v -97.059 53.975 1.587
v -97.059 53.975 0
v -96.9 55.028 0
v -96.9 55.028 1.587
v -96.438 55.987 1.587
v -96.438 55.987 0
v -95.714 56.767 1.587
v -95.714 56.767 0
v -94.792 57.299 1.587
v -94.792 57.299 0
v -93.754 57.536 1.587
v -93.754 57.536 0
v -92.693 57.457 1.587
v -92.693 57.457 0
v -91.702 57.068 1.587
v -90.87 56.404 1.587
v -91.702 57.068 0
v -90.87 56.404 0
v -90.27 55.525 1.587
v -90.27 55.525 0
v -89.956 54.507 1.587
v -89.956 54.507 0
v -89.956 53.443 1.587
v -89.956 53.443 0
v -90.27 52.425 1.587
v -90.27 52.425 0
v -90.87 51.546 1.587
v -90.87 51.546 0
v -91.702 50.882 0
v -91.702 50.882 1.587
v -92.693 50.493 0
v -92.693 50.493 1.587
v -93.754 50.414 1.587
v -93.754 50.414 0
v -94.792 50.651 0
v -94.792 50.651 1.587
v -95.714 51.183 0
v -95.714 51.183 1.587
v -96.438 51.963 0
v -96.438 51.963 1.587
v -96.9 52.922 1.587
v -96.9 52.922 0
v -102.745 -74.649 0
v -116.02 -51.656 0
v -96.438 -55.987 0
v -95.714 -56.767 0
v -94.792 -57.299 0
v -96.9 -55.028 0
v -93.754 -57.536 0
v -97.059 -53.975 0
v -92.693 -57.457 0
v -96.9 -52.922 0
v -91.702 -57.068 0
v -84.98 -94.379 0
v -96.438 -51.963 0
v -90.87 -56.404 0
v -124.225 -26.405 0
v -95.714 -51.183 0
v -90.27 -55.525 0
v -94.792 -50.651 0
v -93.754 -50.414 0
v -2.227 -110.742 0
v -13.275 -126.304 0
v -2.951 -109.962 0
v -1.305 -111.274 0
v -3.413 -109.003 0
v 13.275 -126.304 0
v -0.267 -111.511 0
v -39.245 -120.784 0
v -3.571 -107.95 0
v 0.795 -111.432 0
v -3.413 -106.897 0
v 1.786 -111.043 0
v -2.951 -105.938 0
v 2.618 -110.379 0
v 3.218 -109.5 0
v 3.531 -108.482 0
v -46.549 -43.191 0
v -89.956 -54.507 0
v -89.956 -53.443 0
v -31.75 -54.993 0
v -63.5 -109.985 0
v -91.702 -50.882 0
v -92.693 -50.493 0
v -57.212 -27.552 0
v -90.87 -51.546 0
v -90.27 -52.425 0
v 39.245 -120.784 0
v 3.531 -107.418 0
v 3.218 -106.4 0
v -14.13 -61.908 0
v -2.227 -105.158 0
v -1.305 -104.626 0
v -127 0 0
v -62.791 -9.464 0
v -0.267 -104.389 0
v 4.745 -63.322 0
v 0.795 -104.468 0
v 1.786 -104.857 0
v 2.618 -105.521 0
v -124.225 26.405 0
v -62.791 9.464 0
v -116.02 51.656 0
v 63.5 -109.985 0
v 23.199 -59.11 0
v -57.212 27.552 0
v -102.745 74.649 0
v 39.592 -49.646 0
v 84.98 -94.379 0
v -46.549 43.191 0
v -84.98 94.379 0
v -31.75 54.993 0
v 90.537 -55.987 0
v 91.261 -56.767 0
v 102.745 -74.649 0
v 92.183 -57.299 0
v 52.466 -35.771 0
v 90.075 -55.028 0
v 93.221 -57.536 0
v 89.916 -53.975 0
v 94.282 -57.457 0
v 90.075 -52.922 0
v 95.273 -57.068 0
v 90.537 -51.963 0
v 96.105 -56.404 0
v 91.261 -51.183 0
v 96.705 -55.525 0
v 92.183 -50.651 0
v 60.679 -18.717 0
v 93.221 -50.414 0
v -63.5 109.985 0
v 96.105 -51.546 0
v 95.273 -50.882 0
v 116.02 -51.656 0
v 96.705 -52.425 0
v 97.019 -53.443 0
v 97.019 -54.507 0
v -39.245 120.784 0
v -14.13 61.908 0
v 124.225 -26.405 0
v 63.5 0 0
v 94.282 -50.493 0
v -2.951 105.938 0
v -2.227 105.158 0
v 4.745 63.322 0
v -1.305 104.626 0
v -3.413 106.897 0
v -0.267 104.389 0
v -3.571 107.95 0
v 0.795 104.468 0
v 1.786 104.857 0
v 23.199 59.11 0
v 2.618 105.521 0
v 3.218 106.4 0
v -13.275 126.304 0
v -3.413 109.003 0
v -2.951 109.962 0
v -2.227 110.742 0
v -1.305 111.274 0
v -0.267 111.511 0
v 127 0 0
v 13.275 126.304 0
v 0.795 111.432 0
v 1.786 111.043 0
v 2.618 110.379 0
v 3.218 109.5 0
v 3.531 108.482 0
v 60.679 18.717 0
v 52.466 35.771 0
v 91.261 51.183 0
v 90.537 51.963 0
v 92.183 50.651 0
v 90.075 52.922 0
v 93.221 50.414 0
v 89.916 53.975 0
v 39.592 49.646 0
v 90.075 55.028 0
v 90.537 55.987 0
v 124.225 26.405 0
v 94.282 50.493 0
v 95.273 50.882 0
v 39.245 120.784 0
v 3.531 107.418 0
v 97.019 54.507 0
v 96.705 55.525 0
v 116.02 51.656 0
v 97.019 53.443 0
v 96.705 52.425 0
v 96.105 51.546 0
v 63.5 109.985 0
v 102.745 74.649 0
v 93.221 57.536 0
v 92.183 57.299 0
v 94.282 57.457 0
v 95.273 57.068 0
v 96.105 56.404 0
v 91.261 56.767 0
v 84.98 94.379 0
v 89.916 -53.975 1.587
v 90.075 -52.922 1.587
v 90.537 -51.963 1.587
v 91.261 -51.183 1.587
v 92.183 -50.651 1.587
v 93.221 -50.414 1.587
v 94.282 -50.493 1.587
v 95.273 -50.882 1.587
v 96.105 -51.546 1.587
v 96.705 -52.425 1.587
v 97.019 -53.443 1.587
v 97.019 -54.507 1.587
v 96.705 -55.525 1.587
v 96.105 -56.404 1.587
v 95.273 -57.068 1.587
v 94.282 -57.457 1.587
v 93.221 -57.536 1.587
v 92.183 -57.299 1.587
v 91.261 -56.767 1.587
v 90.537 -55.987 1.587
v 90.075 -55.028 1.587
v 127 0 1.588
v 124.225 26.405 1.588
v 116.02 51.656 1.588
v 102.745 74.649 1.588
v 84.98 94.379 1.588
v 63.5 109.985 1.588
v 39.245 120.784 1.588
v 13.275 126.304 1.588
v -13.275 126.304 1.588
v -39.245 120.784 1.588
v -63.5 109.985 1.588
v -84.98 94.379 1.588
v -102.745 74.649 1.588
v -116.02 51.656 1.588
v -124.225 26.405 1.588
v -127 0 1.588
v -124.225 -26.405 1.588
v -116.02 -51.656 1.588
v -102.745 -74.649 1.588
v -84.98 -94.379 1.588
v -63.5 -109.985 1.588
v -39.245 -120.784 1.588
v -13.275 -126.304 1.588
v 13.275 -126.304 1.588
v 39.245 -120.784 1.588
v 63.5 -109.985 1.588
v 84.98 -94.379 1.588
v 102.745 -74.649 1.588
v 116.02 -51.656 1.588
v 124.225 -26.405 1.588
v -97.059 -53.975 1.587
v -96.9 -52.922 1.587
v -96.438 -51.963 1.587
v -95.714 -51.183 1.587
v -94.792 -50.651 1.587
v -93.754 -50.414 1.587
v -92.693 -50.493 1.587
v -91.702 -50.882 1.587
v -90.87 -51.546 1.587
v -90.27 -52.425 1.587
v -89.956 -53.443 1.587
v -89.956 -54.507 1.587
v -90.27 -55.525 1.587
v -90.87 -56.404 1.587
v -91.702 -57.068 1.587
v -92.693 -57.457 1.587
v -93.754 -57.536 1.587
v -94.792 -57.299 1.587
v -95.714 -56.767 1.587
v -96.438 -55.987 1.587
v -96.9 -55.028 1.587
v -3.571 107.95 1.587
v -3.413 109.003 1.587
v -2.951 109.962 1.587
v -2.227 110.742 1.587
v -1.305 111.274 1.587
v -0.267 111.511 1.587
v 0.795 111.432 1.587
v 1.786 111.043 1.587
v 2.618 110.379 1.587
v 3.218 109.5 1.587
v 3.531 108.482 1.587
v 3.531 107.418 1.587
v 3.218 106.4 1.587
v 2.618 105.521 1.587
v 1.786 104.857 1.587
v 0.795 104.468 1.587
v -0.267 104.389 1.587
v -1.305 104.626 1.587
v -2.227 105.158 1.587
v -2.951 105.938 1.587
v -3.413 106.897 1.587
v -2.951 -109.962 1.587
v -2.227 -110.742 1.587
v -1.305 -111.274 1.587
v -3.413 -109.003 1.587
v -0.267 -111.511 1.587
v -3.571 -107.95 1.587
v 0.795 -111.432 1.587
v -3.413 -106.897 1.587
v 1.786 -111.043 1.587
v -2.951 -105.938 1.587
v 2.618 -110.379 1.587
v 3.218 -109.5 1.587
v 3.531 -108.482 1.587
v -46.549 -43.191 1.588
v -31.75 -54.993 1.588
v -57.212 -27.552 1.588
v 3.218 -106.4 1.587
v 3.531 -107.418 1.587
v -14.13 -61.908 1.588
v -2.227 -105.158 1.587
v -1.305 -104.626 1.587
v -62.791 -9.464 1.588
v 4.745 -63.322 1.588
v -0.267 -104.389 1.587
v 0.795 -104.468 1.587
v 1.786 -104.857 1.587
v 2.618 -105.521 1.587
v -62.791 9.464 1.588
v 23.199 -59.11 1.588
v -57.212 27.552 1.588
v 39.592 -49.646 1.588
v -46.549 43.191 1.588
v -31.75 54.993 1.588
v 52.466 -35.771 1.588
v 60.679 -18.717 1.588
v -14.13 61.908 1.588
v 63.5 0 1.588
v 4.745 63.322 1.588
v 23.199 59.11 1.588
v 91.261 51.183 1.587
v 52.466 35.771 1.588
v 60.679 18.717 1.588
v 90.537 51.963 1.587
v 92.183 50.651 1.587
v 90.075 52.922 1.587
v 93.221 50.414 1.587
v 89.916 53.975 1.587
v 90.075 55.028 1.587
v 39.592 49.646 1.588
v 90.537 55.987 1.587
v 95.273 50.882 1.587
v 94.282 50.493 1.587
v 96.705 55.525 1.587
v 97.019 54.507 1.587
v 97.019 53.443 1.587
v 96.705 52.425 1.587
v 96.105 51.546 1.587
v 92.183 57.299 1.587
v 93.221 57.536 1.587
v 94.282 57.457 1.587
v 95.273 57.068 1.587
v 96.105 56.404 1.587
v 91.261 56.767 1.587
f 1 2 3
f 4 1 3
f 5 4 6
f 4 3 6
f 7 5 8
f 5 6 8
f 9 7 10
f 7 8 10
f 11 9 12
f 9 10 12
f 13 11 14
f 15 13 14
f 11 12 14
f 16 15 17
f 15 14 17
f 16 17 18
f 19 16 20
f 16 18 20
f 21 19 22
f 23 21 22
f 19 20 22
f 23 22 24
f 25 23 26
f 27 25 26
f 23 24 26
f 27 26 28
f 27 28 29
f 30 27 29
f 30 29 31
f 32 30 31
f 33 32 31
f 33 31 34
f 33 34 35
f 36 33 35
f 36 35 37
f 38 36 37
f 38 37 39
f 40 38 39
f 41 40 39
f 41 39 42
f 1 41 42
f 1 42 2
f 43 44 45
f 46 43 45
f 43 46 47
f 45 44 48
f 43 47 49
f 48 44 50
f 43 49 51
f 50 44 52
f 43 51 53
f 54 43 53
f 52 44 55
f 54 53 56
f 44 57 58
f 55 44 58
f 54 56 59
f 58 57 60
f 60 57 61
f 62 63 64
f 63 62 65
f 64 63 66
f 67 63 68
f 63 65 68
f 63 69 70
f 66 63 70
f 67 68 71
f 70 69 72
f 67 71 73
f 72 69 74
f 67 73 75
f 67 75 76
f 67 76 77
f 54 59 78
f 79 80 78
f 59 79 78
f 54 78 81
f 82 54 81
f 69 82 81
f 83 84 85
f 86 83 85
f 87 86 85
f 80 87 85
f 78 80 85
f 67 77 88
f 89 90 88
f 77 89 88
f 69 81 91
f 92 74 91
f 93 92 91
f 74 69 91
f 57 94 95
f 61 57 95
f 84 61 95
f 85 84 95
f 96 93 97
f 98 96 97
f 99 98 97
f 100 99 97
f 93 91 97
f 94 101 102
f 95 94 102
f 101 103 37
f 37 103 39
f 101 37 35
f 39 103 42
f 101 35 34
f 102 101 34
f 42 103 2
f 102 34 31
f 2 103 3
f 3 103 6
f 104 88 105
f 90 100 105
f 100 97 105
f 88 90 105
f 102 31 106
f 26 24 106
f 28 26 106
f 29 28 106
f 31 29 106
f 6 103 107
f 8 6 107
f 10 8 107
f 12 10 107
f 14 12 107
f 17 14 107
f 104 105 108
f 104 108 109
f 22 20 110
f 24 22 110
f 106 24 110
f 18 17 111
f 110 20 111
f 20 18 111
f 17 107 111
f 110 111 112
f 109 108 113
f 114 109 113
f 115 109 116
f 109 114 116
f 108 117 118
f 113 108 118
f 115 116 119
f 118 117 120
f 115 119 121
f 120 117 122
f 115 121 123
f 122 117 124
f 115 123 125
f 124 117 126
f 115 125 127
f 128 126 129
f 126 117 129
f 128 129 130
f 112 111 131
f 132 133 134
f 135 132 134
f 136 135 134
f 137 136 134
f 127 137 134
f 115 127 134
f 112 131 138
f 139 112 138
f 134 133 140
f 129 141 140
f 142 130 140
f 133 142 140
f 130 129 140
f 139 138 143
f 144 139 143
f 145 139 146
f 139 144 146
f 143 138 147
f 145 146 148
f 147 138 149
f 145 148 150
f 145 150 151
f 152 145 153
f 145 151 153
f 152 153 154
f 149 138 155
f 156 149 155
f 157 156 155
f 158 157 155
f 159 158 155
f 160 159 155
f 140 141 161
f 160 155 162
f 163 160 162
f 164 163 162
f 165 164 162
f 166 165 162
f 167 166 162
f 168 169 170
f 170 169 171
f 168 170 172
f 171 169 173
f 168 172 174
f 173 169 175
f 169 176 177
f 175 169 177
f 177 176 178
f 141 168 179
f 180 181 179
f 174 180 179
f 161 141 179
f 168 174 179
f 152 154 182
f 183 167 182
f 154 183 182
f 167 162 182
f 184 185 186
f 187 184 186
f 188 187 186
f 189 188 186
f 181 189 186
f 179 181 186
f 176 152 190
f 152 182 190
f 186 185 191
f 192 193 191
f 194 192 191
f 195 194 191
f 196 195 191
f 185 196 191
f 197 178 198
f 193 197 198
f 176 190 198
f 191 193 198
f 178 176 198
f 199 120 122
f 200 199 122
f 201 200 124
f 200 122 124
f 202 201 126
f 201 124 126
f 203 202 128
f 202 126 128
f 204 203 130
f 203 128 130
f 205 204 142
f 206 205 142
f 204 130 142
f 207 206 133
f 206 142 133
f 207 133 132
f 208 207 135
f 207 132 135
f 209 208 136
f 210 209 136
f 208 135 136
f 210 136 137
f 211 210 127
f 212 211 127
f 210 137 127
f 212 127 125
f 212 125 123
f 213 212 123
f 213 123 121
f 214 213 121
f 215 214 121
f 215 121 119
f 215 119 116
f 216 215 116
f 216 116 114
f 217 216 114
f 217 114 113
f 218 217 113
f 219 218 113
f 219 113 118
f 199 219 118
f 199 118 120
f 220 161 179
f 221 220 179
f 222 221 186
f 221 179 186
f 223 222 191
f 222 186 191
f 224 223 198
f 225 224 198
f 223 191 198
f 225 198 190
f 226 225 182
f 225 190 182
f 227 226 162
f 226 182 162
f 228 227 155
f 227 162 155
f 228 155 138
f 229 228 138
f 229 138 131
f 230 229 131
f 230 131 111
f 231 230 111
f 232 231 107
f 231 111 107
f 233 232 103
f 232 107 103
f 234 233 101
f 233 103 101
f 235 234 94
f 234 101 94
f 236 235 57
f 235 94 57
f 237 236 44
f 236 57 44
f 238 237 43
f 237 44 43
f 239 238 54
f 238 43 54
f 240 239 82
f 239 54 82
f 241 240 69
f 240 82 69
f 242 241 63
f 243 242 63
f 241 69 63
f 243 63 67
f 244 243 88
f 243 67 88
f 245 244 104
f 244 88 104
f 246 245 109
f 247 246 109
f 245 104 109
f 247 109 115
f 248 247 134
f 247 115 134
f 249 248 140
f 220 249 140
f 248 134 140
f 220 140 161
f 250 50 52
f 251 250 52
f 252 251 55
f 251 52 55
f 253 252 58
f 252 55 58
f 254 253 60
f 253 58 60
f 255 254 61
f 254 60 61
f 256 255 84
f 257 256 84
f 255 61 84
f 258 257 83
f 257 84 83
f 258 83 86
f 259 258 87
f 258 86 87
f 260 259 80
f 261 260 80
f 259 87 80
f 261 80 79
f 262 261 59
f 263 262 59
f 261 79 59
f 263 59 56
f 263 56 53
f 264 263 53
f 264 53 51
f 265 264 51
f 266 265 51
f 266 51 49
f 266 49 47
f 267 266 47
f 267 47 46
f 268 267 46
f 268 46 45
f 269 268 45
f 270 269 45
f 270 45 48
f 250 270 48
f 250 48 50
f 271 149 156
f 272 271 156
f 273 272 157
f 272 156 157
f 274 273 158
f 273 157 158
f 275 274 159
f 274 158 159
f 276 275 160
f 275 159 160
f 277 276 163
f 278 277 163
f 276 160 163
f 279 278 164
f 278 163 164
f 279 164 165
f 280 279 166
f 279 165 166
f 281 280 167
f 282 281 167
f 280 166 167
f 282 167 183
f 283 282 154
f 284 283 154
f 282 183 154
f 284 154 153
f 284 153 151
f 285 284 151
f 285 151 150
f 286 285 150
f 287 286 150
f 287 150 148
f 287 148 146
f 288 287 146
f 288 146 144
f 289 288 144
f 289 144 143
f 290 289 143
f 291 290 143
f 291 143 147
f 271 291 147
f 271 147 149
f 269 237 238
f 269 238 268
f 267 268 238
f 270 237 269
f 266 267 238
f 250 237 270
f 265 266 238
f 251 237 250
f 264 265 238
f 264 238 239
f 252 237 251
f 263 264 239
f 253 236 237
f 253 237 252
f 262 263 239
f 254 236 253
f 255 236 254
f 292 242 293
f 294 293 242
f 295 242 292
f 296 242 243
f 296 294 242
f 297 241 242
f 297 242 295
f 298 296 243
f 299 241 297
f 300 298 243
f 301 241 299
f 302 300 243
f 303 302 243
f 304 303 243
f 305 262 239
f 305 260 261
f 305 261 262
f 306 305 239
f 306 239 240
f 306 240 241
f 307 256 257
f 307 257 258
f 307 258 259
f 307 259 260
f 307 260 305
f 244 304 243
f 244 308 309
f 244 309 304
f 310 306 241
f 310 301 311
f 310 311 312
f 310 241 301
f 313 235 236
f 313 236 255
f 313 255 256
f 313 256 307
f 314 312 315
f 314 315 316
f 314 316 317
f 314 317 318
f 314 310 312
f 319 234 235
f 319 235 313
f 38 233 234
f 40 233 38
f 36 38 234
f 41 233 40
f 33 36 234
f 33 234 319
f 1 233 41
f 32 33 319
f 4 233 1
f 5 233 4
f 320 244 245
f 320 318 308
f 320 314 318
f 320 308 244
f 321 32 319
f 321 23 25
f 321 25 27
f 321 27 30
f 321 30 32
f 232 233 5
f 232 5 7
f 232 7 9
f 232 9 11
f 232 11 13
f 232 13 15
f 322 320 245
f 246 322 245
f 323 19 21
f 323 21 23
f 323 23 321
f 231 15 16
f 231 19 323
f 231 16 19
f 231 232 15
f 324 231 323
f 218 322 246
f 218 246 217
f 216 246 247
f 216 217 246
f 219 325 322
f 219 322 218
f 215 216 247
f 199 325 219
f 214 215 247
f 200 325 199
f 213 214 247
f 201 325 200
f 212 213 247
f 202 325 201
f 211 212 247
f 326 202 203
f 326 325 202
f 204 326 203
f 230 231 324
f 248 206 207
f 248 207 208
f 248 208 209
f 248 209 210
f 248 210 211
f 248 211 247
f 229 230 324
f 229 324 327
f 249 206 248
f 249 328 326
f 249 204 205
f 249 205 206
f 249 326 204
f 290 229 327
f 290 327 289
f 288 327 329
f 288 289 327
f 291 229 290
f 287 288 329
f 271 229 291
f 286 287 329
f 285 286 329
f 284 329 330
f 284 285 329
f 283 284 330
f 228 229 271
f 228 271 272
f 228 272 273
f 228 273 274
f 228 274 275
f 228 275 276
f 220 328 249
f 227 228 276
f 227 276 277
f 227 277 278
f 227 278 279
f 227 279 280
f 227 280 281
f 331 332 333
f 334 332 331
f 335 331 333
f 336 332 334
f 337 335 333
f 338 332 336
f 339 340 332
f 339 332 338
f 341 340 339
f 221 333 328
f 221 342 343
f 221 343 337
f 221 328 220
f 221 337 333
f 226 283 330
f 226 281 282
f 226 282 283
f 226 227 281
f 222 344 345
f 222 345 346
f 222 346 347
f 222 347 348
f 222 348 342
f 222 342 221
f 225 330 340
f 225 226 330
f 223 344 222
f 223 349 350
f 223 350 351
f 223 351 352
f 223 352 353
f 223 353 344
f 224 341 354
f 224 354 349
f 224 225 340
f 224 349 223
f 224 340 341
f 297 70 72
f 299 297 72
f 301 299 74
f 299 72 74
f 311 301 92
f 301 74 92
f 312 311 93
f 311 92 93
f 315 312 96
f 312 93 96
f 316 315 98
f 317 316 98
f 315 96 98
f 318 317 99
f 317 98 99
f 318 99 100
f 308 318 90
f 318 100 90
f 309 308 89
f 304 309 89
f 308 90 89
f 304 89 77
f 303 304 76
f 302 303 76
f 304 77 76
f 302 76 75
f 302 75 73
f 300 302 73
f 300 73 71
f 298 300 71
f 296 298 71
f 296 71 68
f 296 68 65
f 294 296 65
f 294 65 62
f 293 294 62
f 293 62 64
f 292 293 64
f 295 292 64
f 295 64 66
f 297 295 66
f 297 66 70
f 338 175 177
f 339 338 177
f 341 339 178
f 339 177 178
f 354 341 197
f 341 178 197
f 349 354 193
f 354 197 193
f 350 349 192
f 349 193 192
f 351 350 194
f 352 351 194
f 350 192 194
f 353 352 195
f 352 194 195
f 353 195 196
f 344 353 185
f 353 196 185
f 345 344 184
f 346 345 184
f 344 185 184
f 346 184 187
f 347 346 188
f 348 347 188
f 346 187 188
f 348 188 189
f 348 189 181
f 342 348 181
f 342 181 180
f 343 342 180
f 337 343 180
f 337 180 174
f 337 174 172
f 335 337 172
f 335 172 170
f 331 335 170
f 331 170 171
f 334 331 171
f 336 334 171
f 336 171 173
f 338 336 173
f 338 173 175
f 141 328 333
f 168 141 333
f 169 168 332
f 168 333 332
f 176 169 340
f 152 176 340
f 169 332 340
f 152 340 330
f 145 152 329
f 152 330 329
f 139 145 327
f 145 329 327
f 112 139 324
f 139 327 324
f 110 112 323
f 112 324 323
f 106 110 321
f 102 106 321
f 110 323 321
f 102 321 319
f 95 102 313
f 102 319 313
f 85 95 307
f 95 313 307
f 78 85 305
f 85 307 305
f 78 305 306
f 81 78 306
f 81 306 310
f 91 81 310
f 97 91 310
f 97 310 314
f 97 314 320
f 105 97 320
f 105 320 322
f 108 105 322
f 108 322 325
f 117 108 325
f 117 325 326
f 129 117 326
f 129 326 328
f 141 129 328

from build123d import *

# Parameters (mm, degrees)
SKETCH1_R               = 127
BOSS_EXTRUDE1_DEPTH     = 1.5875
F_1_4_CLEARANCE_HOLE1_D = 7.14248
CUT_EXTRUDE1_REACH      = 181.612
SKETCH4_R               = 63.5


with BuildPart() as part:
    # Sketch1 → Boss-Extrude1 (new body)
    with BuildSketch(Plane.XY):
        Circle(SKETCH1_R)
    extrude(amount=BOSS_EXTRUDE1_DEPTH)

    # 1/4 Clearance Hole1 (through all)
    with Locations(Plane.XY.offset(1.5875)):
        with Locations((-93.487442339, 53.975), (0, 107.95), (93.487442339, 53.975), (93.487442339, -53.975), (0, -107.95), (-93.487442339, -53.975)):
            Hole(F_1_4_CLEARANCE_HOLE1_D / 2)

    # Sketch4 → Cut-Extrude1 (cut, up to next)
    with BuildSketch(Plane.XY.offset(1.5875), mode=Mode.PRIVATE) as cut_extrude1_sk1:
        Circle(SKETCH4_R)
    cut_extrude1_tool1 = extrude(cut_extrude1_sk1.sketch, amount=-CUT_EXTRUDE1_REACH, mode=Mode.PRIVATE) & part.part
    add(cut_extrude1_tool1.solids().sort_by_distance((0, 0, 1.5875))[0], mode=Mode.SUBTRACT)


solid = part.part
